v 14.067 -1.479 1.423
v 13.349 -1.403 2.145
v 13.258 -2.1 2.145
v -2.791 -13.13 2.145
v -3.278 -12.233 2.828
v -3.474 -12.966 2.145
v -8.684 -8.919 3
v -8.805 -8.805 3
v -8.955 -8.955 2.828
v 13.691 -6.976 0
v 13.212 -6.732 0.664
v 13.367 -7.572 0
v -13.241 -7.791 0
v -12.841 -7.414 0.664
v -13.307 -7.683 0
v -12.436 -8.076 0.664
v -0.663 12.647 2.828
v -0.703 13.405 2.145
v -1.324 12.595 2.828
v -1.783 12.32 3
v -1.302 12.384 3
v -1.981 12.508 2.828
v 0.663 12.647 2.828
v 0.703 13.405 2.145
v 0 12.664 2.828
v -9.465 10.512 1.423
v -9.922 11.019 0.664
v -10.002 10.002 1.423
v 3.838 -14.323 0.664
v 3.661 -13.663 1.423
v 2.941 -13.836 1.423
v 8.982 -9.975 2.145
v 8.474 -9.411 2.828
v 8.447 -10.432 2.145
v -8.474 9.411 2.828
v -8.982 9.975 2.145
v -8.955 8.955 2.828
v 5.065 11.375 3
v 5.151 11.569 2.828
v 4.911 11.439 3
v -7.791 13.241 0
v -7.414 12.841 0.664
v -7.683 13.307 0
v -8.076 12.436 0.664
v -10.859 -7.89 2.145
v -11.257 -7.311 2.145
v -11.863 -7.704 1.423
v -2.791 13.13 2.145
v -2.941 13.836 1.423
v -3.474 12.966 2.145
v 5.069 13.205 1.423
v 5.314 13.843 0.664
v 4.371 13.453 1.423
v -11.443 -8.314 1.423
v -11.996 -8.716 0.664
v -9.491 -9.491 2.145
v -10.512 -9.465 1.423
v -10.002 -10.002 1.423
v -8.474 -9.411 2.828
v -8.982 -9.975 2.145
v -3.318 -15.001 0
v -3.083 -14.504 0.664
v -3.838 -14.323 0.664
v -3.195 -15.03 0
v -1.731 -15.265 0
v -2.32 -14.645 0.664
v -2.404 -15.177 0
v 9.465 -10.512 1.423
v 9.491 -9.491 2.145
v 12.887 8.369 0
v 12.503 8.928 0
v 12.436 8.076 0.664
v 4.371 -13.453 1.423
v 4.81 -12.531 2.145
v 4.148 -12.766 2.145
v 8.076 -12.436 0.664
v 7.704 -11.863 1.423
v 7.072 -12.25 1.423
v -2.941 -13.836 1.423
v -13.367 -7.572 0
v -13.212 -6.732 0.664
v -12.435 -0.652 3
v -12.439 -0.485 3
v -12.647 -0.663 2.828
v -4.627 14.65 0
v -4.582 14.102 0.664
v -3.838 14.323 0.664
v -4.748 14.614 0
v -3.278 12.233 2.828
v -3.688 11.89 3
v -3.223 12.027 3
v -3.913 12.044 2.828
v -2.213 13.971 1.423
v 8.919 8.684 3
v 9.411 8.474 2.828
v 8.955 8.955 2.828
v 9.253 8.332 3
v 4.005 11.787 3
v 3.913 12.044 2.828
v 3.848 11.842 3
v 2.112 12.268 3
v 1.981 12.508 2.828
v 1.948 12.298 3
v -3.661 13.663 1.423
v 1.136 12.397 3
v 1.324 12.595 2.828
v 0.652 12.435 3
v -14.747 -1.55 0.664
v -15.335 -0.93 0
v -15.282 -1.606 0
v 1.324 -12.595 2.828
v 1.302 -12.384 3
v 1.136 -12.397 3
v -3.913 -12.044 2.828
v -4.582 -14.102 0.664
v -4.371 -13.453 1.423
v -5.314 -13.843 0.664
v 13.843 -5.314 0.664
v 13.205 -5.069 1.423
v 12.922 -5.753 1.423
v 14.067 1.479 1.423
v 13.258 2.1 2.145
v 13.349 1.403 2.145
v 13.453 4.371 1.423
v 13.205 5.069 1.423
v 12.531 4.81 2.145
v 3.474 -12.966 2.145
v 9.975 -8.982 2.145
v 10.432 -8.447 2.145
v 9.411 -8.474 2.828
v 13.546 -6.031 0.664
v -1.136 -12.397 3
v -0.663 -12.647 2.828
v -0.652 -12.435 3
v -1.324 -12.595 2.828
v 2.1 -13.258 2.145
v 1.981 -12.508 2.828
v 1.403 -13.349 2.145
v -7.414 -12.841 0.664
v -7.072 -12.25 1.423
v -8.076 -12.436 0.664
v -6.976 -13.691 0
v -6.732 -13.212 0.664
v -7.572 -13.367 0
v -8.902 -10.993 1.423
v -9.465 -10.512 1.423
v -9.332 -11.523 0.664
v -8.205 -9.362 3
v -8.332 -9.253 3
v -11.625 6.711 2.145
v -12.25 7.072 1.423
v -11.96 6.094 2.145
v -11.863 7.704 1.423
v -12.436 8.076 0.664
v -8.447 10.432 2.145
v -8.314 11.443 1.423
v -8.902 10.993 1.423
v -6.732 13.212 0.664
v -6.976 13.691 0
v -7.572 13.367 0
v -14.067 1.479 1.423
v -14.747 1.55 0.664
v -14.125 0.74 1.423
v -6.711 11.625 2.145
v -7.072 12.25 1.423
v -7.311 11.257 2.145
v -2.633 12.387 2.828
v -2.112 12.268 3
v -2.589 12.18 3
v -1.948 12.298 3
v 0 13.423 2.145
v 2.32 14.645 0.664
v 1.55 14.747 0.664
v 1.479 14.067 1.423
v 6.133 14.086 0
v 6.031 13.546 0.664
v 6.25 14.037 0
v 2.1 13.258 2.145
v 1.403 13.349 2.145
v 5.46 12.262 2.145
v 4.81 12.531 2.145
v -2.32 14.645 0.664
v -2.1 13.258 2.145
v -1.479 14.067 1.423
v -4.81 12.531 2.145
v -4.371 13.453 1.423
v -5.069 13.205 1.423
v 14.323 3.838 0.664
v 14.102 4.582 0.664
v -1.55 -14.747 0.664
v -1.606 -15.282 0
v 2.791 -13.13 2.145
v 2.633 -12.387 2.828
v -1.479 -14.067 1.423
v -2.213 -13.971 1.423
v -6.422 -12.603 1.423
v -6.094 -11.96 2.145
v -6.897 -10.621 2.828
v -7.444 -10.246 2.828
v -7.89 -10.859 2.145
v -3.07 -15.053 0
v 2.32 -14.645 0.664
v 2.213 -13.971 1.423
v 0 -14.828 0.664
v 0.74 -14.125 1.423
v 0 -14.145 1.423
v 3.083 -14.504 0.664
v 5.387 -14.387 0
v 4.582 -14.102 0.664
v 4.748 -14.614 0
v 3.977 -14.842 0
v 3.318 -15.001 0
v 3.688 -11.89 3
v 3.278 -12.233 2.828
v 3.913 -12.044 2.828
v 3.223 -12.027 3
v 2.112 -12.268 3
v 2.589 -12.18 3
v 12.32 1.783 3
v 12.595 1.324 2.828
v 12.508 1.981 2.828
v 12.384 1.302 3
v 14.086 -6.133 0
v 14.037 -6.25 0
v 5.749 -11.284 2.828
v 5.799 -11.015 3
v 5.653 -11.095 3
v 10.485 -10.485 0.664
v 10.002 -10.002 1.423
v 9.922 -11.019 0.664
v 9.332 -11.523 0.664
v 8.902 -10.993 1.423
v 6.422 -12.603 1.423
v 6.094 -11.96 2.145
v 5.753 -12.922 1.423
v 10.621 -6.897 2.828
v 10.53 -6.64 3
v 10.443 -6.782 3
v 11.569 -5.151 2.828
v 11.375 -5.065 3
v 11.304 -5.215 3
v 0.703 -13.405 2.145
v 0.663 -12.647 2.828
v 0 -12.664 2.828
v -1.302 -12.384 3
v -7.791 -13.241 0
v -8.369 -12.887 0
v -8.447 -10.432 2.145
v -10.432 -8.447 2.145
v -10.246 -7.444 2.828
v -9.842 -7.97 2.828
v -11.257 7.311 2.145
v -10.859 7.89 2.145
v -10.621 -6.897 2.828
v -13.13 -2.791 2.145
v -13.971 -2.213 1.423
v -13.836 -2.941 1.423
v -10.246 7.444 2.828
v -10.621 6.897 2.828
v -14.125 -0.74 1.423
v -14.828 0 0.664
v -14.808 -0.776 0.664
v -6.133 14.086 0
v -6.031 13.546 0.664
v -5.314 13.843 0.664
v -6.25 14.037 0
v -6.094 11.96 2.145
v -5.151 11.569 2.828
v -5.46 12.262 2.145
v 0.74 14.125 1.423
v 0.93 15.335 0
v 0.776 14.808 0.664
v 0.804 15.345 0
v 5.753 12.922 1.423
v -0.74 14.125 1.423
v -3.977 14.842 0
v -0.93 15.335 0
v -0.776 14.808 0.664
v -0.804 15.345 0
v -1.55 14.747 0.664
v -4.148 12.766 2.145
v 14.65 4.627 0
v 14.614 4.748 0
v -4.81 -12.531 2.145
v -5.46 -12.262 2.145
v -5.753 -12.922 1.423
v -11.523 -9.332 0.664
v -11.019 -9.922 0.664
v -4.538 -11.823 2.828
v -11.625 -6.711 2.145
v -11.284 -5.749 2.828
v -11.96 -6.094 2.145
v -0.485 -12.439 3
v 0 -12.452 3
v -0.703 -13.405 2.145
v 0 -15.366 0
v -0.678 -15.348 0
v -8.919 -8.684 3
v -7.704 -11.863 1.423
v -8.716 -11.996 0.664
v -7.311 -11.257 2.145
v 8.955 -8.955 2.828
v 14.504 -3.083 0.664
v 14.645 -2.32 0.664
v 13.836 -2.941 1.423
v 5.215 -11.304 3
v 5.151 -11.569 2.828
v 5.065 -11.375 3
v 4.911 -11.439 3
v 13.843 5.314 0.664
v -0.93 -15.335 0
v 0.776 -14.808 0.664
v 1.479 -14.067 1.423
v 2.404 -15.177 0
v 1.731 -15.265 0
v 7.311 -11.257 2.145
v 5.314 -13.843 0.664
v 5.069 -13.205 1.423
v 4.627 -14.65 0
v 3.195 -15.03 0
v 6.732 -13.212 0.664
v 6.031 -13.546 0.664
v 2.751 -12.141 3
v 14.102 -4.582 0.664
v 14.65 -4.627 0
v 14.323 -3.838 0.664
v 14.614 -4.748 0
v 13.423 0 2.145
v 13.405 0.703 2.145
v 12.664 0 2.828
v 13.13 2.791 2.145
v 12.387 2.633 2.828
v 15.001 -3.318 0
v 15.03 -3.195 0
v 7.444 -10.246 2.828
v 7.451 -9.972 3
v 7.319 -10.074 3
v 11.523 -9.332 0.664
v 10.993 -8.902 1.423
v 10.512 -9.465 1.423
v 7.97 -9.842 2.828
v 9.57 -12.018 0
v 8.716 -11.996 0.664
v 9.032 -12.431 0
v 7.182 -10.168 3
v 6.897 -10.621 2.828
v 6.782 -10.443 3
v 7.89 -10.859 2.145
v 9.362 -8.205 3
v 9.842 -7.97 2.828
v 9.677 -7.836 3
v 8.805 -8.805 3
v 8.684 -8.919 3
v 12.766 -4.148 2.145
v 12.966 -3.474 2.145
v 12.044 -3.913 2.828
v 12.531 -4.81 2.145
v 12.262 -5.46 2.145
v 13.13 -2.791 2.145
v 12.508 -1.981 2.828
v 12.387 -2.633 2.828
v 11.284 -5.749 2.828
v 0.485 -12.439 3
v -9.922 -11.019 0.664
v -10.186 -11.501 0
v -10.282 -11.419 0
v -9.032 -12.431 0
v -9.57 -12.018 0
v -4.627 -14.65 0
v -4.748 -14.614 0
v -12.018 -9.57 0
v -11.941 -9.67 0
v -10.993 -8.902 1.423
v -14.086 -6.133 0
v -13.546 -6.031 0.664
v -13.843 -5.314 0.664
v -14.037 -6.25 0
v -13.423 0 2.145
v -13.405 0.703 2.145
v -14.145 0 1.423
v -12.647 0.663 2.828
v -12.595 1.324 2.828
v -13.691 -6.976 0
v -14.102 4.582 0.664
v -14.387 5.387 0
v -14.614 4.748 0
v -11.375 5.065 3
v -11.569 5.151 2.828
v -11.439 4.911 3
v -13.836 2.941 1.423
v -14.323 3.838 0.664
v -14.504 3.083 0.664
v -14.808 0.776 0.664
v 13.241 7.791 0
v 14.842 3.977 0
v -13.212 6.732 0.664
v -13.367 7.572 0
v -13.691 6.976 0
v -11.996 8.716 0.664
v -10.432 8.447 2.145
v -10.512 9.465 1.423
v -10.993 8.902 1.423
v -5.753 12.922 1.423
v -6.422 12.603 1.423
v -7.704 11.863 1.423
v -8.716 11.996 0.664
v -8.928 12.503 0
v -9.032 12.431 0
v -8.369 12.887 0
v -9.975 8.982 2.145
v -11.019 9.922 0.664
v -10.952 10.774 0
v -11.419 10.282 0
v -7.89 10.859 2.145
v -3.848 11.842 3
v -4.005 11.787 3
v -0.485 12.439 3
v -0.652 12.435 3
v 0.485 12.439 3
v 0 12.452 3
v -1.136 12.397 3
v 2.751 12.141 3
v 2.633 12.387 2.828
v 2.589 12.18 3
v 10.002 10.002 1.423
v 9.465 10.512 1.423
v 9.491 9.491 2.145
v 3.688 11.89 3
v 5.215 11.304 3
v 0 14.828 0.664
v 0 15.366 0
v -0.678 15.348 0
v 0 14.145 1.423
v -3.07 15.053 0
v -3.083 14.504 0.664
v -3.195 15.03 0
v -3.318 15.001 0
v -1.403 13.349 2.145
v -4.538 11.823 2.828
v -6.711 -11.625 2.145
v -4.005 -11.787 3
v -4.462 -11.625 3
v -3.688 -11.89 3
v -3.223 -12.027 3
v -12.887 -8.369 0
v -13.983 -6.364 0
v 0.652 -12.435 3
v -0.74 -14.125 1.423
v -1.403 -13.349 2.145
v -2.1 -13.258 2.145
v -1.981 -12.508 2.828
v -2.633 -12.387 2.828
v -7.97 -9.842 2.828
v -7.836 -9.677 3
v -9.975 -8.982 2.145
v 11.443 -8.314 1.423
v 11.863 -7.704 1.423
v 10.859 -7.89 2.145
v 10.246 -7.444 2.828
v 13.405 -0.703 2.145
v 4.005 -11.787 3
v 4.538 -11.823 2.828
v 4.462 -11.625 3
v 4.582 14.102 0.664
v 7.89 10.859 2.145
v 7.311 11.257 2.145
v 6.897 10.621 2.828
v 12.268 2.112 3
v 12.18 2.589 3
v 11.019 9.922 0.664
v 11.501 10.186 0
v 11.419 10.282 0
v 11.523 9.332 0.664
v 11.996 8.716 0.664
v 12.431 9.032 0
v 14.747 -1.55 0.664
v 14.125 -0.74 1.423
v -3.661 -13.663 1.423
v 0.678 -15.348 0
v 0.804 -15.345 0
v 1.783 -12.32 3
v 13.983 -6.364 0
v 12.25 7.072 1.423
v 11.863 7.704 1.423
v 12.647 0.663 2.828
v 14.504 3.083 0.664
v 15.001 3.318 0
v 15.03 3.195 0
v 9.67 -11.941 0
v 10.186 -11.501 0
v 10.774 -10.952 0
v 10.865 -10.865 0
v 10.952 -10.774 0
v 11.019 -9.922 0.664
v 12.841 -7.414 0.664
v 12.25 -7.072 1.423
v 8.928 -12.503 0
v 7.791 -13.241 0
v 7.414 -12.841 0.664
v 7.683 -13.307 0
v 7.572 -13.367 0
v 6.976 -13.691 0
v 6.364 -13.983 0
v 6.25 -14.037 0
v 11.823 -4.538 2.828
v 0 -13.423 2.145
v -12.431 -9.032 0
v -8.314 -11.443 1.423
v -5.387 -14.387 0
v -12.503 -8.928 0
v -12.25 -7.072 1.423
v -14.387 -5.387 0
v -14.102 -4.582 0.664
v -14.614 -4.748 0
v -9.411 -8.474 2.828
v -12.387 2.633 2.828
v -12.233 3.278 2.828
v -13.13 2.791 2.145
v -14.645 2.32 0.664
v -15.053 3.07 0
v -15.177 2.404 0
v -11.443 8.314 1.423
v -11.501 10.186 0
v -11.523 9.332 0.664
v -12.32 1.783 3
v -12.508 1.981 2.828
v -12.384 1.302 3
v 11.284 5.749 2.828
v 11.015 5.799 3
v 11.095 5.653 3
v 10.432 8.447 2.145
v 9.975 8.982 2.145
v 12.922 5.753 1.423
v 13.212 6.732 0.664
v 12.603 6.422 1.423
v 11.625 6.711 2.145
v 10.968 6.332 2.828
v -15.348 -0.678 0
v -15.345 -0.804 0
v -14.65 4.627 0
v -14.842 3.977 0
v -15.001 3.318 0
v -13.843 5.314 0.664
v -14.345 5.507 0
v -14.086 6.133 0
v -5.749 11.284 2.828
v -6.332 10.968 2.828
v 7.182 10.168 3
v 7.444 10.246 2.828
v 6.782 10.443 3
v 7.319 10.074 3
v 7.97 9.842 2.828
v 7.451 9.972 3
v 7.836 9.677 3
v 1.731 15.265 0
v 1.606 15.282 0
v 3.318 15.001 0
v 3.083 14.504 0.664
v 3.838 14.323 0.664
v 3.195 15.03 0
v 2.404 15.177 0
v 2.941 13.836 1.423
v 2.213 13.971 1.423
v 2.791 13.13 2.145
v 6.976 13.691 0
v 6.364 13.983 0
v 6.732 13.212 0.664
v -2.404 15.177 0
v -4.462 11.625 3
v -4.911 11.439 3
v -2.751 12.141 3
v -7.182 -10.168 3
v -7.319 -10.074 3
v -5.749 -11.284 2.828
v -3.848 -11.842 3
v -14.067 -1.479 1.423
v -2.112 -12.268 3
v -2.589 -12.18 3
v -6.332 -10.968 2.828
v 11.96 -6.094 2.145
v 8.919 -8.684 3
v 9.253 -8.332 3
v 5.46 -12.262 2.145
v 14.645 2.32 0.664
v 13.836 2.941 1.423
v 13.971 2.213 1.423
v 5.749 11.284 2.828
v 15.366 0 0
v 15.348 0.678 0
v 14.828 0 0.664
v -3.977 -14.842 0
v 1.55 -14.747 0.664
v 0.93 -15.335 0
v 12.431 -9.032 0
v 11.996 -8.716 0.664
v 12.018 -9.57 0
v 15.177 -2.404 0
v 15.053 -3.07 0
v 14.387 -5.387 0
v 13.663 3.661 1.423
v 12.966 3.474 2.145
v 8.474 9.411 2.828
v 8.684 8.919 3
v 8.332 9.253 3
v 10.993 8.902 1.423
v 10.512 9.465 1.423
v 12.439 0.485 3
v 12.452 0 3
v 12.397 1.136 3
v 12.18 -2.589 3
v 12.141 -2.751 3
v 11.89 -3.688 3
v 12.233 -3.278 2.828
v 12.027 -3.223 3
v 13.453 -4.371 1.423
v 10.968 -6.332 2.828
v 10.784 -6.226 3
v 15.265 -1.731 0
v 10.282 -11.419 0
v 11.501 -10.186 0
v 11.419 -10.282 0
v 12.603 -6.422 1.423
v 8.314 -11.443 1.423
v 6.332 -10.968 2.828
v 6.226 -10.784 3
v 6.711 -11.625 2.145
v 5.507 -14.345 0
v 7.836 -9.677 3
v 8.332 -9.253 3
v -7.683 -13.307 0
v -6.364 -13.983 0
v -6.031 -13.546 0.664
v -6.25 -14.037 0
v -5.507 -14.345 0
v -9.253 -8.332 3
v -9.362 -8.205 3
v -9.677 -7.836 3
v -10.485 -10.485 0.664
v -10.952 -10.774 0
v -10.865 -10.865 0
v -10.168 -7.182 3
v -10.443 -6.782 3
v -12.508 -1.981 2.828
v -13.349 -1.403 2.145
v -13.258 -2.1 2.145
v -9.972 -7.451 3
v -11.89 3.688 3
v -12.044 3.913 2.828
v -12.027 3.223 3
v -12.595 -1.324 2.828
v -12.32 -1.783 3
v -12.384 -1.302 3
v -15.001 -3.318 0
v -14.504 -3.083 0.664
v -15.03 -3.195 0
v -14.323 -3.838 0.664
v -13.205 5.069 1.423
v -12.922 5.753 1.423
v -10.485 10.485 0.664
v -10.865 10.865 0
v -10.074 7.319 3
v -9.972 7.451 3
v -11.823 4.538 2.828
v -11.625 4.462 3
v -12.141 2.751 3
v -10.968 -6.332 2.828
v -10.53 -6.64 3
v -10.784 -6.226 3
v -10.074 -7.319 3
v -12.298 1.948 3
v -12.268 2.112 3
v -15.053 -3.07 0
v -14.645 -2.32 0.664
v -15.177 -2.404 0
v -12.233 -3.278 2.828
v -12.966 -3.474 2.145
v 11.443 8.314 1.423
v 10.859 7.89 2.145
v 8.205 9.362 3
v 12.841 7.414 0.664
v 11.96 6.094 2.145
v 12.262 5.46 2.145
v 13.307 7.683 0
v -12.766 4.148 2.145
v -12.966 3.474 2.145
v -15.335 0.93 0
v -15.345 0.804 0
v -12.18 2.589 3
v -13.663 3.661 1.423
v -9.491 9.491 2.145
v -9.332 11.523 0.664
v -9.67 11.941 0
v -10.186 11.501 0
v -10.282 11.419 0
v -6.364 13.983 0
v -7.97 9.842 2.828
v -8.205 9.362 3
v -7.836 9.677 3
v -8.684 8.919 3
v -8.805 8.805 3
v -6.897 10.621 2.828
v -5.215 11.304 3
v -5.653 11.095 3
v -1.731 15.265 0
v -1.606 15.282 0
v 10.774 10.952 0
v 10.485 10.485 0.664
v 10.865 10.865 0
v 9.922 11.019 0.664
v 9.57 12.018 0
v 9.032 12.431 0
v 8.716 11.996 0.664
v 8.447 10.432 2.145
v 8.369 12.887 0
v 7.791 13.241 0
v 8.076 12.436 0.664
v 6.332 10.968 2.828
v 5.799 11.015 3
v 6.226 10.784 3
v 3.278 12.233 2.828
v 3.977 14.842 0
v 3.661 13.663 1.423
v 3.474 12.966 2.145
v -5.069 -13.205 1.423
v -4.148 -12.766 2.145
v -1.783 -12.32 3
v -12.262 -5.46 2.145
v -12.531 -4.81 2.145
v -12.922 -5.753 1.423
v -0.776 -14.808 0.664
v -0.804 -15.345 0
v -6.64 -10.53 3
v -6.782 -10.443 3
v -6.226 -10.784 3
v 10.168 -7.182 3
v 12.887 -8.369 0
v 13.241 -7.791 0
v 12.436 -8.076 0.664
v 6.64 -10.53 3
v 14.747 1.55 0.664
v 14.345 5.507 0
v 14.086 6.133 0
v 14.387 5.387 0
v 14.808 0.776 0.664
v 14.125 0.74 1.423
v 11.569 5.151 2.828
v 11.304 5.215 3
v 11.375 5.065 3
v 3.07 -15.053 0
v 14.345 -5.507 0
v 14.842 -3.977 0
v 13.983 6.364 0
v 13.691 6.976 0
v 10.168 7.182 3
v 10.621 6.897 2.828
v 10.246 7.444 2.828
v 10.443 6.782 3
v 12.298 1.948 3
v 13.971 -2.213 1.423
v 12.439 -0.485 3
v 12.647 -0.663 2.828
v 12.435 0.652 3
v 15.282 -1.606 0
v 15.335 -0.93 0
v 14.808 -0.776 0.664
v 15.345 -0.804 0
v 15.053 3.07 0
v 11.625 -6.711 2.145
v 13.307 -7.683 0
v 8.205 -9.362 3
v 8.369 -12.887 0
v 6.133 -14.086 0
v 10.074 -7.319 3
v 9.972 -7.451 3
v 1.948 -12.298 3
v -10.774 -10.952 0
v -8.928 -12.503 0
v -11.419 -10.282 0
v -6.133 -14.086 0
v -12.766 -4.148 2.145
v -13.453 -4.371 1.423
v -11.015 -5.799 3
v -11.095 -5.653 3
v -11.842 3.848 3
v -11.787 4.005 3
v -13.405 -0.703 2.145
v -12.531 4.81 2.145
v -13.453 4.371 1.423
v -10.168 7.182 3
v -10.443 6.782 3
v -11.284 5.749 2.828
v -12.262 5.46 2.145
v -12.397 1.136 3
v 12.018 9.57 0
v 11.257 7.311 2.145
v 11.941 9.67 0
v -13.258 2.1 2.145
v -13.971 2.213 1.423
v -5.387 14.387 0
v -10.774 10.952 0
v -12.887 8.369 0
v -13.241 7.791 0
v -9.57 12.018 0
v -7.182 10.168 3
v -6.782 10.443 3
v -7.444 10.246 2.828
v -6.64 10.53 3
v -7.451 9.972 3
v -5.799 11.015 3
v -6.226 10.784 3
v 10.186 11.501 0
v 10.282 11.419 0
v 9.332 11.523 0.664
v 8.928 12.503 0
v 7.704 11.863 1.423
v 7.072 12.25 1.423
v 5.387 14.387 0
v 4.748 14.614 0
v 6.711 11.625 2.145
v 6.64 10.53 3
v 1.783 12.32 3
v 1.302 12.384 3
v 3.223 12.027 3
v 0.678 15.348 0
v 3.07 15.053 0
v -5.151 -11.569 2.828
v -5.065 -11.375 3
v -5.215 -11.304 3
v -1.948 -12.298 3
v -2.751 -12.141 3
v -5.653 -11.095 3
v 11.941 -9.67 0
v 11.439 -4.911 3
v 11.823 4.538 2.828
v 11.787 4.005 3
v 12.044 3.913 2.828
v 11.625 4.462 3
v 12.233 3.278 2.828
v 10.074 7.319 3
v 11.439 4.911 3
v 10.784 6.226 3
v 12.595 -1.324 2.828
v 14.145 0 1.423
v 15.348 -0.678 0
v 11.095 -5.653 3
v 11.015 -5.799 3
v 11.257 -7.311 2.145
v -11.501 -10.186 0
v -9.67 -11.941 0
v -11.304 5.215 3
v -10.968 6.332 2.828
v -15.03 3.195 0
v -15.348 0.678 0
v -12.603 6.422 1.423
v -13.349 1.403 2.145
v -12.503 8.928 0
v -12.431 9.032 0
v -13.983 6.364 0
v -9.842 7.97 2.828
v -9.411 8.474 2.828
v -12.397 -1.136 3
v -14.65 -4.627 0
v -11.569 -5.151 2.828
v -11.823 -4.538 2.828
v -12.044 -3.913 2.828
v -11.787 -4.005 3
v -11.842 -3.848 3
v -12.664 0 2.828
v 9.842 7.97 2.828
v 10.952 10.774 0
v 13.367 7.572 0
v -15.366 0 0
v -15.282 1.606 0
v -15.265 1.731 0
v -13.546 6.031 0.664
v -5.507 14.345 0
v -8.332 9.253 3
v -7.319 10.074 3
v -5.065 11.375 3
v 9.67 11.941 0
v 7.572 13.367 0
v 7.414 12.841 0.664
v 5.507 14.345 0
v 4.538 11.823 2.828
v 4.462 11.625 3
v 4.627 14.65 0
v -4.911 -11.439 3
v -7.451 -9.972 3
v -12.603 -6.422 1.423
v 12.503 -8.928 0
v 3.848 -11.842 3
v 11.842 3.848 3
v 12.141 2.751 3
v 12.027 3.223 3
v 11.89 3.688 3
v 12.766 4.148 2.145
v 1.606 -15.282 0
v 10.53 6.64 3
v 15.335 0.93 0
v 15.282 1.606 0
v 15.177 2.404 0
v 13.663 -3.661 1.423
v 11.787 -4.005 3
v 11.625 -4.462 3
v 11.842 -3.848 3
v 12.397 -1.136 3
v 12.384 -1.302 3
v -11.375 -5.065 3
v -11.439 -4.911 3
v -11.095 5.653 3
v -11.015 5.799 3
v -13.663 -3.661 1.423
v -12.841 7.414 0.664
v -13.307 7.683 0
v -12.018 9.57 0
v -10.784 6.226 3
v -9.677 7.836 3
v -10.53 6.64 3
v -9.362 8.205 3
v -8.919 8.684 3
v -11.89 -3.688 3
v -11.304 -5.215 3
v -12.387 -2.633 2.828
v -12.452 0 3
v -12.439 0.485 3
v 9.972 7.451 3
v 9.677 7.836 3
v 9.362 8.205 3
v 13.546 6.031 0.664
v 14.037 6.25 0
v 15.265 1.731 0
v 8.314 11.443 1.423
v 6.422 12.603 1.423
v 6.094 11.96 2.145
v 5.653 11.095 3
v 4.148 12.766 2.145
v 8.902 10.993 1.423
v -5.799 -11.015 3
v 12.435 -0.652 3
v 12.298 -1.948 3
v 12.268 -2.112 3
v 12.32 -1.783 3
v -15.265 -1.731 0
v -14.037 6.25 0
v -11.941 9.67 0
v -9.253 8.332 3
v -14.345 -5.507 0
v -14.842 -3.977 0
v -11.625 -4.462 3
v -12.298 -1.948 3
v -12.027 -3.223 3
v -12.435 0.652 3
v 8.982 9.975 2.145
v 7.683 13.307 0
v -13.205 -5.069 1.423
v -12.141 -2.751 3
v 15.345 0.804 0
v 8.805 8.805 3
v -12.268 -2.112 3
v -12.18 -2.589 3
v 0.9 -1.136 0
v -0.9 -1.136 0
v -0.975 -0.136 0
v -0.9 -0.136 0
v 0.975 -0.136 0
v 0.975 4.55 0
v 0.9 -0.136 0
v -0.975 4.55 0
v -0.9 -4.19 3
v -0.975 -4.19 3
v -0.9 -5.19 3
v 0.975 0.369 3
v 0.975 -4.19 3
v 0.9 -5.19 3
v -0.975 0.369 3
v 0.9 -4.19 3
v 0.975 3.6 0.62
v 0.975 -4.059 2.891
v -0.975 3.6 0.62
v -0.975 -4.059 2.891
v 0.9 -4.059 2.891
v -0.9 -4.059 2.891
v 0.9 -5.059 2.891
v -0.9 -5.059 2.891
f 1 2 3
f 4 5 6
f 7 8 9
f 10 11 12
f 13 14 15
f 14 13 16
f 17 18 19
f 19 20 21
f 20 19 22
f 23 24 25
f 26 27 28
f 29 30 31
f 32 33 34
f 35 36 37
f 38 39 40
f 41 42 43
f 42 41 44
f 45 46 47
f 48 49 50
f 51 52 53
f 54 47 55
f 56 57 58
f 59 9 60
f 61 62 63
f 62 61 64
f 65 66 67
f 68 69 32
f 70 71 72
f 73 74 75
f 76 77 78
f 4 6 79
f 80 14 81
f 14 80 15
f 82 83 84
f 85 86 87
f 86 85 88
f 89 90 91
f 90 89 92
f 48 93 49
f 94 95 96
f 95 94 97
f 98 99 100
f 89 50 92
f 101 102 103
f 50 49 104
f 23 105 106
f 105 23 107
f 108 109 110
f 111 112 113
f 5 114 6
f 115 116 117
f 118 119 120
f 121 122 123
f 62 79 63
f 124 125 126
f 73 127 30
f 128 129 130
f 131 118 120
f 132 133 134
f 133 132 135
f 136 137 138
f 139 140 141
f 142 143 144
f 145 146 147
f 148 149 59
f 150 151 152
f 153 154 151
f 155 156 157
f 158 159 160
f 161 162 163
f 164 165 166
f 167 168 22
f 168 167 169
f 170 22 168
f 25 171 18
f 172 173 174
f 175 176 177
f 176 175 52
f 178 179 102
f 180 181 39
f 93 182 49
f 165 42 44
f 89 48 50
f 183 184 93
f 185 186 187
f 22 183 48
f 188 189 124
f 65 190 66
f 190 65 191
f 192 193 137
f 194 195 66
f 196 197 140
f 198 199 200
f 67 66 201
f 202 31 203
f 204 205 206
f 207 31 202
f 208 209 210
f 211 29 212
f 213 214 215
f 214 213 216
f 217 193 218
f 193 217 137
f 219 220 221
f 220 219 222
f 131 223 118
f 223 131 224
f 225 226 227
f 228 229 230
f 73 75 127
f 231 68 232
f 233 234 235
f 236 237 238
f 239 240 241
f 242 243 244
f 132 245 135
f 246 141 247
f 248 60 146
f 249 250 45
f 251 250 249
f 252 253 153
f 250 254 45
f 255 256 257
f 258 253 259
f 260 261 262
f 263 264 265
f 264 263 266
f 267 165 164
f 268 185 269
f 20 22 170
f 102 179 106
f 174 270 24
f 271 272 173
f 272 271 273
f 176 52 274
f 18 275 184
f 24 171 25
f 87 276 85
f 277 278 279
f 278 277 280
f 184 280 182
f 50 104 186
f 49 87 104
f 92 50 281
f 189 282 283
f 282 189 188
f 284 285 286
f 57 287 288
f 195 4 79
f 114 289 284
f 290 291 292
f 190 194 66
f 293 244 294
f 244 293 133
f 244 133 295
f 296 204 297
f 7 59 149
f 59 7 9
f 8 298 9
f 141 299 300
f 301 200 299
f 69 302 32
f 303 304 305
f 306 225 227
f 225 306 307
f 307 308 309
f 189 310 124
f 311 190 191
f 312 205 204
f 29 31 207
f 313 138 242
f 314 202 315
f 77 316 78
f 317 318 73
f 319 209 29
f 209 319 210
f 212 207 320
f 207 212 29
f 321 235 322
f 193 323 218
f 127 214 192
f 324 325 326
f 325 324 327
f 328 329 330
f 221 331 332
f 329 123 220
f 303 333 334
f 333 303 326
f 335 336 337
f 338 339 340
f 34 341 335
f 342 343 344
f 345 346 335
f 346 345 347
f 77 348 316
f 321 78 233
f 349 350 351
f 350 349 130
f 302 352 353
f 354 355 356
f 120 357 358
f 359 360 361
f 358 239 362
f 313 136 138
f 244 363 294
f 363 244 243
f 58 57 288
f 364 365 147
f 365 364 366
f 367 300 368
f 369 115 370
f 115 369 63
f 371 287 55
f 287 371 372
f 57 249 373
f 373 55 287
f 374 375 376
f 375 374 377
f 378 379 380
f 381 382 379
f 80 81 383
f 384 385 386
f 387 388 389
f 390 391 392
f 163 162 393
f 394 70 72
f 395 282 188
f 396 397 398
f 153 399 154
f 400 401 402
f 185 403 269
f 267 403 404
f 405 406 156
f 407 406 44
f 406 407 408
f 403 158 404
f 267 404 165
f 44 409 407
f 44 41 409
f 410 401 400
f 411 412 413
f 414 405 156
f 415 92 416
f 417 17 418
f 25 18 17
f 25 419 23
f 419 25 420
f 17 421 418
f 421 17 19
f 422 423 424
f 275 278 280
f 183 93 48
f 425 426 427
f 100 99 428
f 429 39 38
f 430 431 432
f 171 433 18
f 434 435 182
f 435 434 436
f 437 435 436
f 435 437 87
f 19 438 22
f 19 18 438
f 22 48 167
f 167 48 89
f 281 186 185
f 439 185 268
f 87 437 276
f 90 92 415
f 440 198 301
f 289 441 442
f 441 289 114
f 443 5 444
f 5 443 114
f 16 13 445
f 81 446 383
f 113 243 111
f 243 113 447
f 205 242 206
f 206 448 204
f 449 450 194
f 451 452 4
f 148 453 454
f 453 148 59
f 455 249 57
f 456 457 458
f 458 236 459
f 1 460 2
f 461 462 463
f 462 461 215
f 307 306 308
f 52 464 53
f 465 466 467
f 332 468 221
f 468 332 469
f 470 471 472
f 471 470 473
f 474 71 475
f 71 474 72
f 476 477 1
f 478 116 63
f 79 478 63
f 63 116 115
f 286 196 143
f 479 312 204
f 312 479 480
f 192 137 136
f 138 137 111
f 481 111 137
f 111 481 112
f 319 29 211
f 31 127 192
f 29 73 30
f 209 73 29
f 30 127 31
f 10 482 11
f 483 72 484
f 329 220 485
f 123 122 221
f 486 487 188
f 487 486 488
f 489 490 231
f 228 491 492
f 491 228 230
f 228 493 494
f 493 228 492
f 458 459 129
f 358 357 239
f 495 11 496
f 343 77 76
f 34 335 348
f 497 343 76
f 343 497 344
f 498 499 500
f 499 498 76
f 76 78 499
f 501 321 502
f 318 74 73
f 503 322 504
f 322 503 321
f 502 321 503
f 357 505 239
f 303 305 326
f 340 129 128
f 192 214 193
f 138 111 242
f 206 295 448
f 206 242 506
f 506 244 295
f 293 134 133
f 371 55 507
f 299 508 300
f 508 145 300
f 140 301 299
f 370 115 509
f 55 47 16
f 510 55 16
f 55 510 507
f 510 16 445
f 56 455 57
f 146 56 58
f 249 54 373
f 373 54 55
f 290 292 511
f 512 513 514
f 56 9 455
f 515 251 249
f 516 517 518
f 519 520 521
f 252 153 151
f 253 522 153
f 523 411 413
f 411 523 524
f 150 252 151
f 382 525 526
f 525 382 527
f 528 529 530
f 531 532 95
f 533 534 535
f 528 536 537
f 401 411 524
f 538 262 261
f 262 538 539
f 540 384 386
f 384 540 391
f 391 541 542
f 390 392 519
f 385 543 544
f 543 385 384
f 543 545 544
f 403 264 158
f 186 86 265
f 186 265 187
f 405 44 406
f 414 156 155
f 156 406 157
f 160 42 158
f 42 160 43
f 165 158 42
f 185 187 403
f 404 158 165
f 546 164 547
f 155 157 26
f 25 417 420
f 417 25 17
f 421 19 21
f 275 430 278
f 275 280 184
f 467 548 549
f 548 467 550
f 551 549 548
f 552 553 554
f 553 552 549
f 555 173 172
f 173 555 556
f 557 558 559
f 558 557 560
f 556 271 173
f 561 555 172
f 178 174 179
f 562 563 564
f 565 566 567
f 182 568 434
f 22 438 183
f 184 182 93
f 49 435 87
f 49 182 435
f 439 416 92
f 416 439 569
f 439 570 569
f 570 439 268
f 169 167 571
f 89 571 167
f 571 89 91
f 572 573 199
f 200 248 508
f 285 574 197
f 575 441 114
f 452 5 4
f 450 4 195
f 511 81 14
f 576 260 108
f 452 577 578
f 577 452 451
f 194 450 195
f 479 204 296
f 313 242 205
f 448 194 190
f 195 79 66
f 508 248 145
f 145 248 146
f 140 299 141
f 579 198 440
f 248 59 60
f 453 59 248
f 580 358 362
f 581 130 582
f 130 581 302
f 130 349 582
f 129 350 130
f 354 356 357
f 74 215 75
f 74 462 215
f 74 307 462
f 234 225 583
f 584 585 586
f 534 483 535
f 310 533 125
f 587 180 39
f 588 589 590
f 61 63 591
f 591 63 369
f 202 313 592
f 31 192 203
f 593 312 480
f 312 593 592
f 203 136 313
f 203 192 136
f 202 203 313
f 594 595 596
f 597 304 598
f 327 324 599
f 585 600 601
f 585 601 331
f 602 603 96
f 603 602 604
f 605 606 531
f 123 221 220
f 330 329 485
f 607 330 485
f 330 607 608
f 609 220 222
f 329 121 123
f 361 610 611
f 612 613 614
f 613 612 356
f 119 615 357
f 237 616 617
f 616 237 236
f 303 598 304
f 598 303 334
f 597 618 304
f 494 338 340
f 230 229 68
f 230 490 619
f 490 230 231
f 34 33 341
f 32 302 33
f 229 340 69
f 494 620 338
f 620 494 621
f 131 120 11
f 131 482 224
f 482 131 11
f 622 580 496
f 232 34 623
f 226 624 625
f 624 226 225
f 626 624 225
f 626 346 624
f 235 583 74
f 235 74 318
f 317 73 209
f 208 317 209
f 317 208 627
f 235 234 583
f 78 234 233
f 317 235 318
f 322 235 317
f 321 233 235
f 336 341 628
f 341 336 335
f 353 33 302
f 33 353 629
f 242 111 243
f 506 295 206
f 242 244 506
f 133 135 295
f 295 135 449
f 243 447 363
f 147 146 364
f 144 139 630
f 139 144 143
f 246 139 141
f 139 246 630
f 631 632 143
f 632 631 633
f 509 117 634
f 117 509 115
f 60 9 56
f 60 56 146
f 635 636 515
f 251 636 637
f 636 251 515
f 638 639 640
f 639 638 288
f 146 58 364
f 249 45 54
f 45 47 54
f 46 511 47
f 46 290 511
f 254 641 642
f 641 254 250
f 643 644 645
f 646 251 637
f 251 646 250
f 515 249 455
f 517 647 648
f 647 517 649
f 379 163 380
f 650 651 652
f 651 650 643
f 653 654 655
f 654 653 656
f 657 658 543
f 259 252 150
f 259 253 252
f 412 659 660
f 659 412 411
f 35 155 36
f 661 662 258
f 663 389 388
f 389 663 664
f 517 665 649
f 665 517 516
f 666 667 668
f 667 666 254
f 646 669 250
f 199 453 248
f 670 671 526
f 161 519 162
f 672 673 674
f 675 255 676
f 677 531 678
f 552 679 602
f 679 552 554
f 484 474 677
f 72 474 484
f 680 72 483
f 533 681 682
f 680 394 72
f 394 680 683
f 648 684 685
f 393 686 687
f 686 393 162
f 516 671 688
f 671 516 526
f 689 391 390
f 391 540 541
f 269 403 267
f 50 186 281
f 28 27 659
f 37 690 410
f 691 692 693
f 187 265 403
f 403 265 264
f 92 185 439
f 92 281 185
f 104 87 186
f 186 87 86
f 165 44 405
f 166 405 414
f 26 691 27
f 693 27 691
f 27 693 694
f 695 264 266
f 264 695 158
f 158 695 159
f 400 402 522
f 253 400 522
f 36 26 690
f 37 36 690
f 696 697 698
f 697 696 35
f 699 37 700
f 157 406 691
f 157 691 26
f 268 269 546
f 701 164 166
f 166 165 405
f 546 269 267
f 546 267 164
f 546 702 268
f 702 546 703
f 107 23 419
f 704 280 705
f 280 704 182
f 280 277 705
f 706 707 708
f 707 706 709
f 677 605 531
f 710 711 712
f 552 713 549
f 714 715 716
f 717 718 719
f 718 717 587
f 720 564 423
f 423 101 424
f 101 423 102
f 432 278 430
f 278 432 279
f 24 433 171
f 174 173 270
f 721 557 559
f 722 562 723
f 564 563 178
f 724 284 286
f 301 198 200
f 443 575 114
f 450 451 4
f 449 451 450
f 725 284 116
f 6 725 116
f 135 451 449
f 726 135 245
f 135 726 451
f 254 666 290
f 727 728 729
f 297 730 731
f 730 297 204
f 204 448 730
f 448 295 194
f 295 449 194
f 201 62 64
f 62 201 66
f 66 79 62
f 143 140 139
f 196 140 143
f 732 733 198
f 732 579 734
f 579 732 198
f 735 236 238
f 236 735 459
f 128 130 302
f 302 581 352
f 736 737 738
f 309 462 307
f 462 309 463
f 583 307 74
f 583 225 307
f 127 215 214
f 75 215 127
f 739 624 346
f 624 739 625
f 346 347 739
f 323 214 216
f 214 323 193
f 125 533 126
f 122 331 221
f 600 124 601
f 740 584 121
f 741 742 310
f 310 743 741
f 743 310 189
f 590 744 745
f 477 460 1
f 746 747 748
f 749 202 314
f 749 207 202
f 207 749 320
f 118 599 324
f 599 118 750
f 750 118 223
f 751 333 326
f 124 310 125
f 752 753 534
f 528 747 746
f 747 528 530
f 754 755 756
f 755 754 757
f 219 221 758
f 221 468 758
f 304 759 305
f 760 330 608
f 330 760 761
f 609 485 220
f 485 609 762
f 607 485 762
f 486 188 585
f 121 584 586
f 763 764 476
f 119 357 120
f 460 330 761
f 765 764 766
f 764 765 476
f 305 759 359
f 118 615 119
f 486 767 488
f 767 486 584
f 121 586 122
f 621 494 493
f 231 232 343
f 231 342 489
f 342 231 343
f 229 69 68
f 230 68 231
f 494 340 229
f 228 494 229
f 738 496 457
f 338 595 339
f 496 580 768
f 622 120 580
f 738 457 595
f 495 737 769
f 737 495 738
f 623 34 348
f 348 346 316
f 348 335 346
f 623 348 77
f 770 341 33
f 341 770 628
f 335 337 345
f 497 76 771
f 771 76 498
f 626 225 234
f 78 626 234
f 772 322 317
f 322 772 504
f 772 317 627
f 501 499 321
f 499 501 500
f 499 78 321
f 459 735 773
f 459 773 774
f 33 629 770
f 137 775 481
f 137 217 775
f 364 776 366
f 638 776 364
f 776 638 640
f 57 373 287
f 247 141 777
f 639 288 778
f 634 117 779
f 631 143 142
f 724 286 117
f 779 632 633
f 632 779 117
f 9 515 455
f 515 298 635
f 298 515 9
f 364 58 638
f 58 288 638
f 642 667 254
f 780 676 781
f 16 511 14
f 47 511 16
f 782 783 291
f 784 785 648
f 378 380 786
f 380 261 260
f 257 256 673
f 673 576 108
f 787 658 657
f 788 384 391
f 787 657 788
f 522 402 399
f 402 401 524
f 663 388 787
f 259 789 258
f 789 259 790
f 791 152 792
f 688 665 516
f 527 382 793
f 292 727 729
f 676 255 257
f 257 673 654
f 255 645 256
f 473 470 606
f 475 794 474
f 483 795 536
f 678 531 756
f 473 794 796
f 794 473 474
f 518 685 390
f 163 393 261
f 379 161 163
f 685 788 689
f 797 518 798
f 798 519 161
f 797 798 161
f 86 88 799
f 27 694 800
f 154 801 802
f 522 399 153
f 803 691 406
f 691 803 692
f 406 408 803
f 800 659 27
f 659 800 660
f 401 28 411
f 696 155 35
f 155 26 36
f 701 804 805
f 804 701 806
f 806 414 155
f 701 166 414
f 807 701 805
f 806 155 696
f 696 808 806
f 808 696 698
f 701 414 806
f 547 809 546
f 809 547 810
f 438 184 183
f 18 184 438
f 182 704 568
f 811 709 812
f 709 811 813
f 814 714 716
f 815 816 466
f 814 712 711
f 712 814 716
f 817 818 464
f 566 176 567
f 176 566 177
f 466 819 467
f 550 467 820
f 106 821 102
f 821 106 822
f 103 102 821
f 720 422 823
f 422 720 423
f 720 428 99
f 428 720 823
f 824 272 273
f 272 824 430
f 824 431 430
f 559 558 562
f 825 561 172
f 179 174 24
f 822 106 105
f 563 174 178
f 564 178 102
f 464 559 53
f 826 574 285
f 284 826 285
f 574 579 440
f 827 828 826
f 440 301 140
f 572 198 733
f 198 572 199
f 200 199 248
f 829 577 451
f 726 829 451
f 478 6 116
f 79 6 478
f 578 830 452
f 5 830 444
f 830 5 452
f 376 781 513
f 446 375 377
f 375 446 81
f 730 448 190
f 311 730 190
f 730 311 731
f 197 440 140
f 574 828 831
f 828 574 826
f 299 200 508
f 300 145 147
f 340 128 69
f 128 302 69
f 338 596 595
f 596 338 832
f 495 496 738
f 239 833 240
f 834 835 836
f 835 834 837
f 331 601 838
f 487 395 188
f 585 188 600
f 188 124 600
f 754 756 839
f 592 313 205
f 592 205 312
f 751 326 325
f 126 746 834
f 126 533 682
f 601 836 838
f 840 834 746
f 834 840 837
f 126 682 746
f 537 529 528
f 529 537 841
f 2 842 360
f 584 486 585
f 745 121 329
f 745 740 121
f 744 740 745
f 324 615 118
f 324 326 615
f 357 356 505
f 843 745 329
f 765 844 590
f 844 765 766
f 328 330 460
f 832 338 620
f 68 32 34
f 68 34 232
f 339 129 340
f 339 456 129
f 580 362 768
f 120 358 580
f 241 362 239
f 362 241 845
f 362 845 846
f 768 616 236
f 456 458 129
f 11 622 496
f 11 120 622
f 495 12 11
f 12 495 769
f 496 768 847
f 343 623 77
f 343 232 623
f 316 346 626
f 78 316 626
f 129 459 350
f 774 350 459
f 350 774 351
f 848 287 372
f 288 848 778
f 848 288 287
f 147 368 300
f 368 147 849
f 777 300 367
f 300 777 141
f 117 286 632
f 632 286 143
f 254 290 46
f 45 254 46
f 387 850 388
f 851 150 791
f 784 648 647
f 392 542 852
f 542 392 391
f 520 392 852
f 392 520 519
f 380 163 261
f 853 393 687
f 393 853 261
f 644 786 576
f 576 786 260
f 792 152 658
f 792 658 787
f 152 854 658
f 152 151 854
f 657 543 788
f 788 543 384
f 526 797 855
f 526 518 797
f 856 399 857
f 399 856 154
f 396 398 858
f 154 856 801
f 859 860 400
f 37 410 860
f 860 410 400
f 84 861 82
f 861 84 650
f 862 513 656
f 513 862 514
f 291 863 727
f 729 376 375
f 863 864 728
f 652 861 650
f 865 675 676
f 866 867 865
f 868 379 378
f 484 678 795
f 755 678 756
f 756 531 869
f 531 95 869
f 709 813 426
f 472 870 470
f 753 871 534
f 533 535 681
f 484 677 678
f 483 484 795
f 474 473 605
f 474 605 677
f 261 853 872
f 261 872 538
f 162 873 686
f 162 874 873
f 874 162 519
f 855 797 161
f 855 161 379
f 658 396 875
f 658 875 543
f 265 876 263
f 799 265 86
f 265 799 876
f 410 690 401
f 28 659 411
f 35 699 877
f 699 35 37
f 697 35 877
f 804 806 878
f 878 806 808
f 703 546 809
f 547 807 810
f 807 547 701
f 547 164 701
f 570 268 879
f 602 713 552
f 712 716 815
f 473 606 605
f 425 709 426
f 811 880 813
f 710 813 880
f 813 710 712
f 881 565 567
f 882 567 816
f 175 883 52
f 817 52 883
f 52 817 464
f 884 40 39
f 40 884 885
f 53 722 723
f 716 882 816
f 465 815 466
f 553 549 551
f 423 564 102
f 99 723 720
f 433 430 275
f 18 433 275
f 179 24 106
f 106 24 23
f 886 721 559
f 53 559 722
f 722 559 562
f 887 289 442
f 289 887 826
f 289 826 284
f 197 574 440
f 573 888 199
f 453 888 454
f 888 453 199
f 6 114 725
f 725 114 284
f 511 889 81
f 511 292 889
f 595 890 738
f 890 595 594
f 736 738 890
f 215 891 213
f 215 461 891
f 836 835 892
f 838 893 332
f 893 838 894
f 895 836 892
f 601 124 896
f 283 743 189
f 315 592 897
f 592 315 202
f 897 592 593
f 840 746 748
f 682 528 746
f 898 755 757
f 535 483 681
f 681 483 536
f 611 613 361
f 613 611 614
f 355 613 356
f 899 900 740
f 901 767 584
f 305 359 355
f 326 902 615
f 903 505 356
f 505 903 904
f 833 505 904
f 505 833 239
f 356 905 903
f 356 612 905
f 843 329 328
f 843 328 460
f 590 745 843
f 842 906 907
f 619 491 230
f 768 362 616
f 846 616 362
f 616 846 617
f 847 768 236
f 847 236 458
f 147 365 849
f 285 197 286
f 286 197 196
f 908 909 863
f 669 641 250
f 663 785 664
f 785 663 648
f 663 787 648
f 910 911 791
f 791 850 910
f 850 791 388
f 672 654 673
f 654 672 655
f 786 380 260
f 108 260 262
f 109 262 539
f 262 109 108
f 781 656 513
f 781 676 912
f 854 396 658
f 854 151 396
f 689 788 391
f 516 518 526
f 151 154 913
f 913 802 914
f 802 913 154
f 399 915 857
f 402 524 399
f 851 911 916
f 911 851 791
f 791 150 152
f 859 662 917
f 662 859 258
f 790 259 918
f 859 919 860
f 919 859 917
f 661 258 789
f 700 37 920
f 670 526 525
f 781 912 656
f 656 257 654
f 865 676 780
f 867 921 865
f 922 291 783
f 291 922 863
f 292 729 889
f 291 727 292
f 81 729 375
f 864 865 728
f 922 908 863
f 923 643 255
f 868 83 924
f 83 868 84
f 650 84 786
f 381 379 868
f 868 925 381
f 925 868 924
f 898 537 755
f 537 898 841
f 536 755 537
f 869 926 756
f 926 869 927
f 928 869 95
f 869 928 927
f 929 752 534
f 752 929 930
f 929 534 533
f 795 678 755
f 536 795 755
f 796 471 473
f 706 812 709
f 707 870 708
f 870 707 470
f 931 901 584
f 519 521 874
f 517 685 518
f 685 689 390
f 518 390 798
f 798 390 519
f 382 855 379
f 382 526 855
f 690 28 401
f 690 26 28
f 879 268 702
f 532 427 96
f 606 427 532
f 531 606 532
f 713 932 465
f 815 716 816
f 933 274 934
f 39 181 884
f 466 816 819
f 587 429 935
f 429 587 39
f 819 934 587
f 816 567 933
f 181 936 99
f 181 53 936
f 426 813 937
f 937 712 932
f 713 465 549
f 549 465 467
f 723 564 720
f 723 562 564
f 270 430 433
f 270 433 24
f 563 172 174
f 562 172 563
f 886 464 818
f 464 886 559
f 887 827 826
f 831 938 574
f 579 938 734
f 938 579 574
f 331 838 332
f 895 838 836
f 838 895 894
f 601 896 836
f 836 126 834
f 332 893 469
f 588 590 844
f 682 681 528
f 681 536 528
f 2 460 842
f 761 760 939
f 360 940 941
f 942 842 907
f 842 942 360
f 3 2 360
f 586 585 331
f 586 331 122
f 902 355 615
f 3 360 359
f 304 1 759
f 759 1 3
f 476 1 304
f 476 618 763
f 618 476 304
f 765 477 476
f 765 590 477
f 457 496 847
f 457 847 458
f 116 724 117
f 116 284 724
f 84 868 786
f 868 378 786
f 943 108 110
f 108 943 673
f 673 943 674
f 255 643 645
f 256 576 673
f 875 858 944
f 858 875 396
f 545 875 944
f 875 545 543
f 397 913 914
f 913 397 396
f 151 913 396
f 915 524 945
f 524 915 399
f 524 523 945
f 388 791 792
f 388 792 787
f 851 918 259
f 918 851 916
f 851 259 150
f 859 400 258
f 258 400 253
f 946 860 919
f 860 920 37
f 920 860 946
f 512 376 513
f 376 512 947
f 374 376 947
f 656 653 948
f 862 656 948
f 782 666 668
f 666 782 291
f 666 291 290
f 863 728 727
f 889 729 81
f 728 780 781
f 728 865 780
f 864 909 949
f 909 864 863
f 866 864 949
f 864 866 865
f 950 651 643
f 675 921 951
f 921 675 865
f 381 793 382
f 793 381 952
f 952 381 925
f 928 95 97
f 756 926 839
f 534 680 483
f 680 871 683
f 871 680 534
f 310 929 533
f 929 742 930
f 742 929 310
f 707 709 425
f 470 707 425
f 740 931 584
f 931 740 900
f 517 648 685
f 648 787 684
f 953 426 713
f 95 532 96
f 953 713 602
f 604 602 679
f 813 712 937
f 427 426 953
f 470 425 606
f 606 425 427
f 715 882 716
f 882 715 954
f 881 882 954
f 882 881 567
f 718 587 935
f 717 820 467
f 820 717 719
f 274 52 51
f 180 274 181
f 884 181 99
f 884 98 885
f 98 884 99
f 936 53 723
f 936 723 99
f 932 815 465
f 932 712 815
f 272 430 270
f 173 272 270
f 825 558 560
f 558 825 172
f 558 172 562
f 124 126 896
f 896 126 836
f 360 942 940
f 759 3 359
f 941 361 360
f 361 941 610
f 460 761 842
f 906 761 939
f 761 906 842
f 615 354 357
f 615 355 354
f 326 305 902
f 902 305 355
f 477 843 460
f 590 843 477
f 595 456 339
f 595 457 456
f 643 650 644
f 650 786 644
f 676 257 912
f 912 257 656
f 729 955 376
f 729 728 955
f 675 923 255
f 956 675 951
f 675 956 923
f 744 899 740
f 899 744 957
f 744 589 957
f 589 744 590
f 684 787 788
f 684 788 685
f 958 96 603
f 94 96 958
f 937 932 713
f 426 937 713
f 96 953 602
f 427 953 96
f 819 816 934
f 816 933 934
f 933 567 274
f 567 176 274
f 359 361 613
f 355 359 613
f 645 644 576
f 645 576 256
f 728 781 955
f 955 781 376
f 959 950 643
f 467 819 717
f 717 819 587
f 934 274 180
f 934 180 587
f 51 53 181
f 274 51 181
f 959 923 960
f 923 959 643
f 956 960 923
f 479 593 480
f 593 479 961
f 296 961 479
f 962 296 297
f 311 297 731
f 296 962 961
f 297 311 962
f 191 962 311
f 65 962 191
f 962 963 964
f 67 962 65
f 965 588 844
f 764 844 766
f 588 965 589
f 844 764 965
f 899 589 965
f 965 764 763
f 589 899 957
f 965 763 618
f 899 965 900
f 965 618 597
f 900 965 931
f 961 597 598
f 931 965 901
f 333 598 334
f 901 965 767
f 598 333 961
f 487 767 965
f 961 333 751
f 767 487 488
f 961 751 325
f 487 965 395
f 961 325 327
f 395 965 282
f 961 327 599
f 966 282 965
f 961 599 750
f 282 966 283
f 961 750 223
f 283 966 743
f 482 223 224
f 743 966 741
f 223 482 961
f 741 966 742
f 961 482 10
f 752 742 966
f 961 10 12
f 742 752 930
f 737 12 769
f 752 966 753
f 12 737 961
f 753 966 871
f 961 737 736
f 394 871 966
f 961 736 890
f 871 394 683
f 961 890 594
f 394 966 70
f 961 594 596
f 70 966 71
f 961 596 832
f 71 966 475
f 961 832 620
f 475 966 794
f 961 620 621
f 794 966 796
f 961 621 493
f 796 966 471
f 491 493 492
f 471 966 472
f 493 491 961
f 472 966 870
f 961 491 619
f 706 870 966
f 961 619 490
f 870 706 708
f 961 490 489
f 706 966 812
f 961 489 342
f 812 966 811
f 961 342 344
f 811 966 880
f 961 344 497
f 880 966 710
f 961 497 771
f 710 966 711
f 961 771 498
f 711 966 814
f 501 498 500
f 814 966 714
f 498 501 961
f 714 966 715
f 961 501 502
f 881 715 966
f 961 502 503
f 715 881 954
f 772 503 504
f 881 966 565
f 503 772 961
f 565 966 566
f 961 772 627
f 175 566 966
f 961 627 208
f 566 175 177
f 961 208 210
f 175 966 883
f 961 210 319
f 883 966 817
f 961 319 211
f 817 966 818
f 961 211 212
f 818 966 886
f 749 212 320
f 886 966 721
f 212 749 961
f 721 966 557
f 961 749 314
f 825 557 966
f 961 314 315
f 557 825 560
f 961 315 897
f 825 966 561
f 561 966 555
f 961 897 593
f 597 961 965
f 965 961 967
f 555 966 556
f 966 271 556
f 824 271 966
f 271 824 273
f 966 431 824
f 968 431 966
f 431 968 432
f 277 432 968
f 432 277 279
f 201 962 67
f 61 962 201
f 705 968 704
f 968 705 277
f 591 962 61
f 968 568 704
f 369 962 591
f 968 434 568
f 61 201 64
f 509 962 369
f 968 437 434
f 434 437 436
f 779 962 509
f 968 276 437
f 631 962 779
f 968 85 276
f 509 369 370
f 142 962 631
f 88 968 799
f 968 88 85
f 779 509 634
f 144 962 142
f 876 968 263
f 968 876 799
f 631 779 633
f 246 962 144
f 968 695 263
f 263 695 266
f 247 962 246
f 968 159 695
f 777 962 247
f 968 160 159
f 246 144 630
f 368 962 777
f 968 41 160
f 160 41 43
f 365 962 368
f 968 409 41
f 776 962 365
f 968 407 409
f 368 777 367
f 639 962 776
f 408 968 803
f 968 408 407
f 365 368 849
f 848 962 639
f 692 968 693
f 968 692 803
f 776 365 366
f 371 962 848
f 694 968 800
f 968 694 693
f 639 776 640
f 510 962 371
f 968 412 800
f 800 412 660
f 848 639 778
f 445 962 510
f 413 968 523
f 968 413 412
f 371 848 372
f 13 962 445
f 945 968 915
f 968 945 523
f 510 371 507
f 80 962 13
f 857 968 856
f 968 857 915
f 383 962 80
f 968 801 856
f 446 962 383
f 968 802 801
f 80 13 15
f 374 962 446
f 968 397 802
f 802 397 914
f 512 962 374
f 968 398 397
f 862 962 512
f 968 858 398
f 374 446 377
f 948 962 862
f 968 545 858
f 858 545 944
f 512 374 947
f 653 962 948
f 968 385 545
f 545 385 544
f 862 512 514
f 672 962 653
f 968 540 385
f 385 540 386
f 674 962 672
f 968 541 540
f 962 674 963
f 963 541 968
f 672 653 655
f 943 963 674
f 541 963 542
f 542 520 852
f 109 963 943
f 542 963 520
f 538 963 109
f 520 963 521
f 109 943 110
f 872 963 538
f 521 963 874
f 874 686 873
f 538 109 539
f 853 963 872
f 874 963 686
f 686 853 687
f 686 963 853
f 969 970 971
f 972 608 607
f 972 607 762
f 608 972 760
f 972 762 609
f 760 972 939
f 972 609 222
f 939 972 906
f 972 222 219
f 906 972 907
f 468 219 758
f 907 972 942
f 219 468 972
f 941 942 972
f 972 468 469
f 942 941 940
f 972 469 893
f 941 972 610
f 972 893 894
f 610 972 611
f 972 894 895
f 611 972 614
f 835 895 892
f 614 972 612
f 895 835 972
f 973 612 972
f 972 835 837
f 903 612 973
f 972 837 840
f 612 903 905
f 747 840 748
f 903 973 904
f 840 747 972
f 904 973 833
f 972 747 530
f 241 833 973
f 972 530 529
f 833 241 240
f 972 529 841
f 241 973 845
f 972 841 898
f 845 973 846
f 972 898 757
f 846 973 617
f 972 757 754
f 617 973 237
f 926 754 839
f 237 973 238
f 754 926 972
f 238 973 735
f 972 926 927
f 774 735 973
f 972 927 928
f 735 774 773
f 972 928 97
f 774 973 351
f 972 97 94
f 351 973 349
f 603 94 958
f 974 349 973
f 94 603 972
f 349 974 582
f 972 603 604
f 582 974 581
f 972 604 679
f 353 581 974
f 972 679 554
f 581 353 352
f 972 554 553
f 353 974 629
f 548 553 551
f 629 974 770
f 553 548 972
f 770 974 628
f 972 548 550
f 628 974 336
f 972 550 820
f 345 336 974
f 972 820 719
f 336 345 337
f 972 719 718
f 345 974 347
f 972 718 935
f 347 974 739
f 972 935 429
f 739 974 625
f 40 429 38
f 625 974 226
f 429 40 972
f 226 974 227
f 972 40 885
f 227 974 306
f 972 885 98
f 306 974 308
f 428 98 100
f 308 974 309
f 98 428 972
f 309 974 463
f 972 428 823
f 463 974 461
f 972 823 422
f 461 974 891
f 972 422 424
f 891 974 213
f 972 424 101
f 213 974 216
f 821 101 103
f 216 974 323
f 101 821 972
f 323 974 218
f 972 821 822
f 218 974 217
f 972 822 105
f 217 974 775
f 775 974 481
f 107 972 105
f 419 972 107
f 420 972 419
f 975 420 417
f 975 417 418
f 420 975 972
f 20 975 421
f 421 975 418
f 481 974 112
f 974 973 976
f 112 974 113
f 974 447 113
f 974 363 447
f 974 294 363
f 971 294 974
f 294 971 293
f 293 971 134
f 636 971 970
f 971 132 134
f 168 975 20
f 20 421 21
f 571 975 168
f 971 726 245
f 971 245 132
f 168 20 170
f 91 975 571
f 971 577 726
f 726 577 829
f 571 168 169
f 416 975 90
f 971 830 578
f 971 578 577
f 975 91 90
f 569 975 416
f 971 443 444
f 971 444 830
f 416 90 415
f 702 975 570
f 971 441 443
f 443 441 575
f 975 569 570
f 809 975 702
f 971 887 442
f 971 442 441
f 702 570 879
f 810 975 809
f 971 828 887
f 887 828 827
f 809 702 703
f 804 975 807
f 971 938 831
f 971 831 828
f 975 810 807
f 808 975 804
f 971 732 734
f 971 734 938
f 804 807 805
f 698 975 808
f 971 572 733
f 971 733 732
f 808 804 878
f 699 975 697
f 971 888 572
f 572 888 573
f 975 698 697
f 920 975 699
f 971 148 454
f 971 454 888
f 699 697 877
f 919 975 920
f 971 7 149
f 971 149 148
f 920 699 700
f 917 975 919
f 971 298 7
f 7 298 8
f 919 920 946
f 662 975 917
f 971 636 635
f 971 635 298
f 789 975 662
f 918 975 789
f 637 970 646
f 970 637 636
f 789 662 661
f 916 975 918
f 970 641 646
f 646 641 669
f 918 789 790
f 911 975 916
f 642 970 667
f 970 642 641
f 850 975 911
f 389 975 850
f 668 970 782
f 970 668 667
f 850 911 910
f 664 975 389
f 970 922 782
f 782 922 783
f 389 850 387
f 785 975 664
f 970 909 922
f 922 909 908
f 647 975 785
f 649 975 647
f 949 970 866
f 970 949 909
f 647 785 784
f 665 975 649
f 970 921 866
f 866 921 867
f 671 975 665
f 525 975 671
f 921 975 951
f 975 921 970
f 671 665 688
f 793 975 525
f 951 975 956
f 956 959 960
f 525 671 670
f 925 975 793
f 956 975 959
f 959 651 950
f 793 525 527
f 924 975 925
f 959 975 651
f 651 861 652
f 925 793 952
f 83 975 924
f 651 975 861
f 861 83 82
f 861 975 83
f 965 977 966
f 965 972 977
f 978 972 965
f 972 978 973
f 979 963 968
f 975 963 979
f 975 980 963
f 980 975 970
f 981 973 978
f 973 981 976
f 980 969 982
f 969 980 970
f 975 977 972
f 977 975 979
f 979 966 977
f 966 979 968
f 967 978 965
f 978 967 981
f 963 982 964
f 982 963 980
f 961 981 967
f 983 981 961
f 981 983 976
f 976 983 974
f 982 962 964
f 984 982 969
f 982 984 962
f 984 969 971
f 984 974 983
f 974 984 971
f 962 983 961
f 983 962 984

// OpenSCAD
$fn = 120;
JOIN = 0.1;

plug_inner_diameter =   2.2;   // mm
plug_inner_to_flat  =   1.8;   // mm
plug_inner_height   =   2.0;   // mm

plug_base_diameter  =   4.0;   // mm
plug_base_height    =   5.0;   // mm

stem_height         =  65.0;  // mm
stem_radius         =  65.0;  // mm

base_diameter       =  30.0;  // mm
base_height         =   3.0;  // mm


cut_flat = plug_inner_diameter - plug_inner_to_flat;

function vector(x) = [x, x, x];


module _lower_cut() {
    translate([0, 0, -base_diameter - 1])
        cube(vector(base_diameter + 1) * 2, center=true);
}


module plug() {
    difference() {
    translate([0, 0, -JOIN])
        cylinder(d=plug_inner_diameter, h=plug_inner_height + JOIN);

        cut_y = (plug_inner_diameter / 2) - cut_flat;
        translate([-10, -20 - cut_y, -10])
            cube(vector(20));
    }
}


module rounded_end_cylinder(diameter=plug_inner_to_flat, height=plug_inner_height) {
    radius = diameter / 2;
    translate([0, 0, radius])
        sphere(d=diameter);
    translate([0, 0, radius])
        cylinder(d=diameter, h=height - radius + JOIN);
}


module plug_base(height=plug_inner_to_flat) {
    diameter = plug_inner_to_flat;
    radius = diameter / 2;

    translate([0, 0, -JOIN]) {
        translate([-diameter, 0, 0])
            rounded_end_cylinder(diameter=diameter, height=height);

        translate([+diameter, 0, 0])
                rounded_end_cylinder(diameter=diameter, height=height);

        translate([-diameter, 0, radius])
            rotate([0, 90, 0])
                cylinder(d=diameter,  h=diameter * 2);

        translate([-diameter, -radius, radius])
            cube([diameter * 2, diameter, (height - radius) + JOIN]);
    }

}


module base_stem_2d(scale_x=2.5) {
    difference() {
        circle(r=stem_radius);

        translate([-plug_inner_to_flat / (scale_x / 2), plug_inner_to_flat * 0.4, 0])
            circle(r=stem_radius);

        translate([-1, stem_height / 2, 0])
            square([stem_radius + 1, stem_radius]);
        translate([-1, -stem_radius - stem_height / 2, 0])
            square([stem_radius + 1, stem_radius]);
        translate([-stem_radius - 1, -stem_radius, 0])
            square([stem_radius + 1, stem_radius * 2]);
    }
}



module stem(scale_x=2.5, width=plug_inner_to_flat) {
    sin_x = ((stem_height / 2) / stem_radius);
    angle_x = asin(sin_x);
    arc_x = cos(angle_x)  * stem_radius;
    dx = arc_x * scale_x ;

    translate([0, 0, -JOIN])
        rotate([90, 0, 0])
            translate([-dx, stem_height / 2, -width / 2])
                scale([scale_x, 1, 1])
                    linear_extrude(width)
                        base_stem_2d(scale_x=scale_x);
}

module _stem_assembly() {
    translate([-0.7, 0, stem_height]) {
        translate([0, -cut_flat / 2, 0])
            plug();
        translate([0, 0, -plug_inner_to_flat])
            plug_base();
    }
    stem();
}

module stem_assembly() {
    rotate([90, 0, 0])
        difference()  {
            _stem_assembly();

            translate([0, 0, -4.5])
                cube(vector(10), center=true);
        }
}


module base_plate() {
    difference() {
        translate([0, 0, -base_diameter * 0.4])
            sphere(r=base_diameter * .65);

        translate([0, 0, -base_diameter - 1])
            cube(vector(base_diameter + 1) * 2, center=true);
        translate([0, 0, base_diameter + base_height + 1])
            cube(vector(base_diameter + 1) * 2, center=true);


        stem(width=plug_inner_to_flat + 0.15);
        translate([1, 0, 0])
            stem(width=plug_inner_to_flat + 0.0);
    }
}



stem_assembly();

!rotate([0, 0, -90]) base_plate();
